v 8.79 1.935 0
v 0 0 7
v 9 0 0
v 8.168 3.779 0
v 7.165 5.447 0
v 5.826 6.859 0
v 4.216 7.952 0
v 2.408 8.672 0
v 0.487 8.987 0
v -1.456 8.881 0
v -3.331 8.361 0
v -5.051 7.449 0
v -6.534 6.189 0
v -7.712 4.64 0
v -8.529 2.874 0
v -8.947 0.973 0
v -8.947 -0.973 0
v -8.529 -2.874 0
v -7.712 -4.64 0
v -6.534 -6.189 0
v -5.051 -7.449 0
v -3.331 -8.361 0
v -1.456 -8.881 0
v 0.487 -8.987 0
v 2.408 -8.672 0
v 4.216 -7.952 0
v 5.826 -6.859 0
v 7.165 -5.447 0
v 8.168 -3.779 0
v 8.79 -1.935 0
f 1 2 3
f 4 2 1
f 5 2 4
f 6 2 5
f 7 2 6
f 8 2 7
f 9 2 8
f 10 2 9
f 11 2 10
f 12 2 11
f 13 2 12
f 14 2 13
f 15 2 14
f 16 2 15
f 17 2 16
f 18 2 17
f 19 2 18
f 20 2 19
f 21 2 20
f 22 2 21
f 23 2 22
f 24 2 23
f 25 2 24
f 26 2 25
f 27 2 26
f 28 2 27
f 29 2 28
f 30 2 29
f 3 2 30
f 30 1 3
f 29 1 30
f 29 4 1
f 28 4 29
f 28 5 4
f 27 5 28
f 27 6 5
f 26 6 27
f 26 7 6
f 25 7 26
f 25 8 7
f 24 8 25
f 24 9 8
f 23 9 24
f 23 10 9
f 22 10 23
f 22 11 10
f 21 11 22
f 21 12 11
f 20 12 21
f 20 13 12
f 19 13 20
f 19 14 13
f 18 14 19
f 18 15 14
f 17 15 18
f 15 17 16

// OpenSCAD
// Generated by SolidPython 1.0.1 on 2020-07-29 00:46:43


cylinder(h = 7, r1 = 9, r2 = 0);
/***********************************************
*********      SolidPython code:      **********
************************************************
 
# import packages: SolidPython
from solid import *
from solid.utils import *
from itertools import chain, combinations, permutations


class Resize:

    def __init__(self, scad_file):
        self.scad_file = scad_file
        #self.scad_file = import_scad(scad_file)
        # cone/cylinder param:
        self.r1 = 0
        self.r2 = 0
        self.h = 0
        # rectangular prism param:
        self.w = 0
        self.l = 0
        # ellipse param:
        self.r = 0

    # import OpenScad code (file name corresponds to shape)


    # classify shape + parameters
    def assign(self, param1, param2, param3):
        if self.scad_file == 'cone.scad':
            self.r1 = param1
            self.r2 = param2
            self.h = param3
        elif self.scad_file == 'cylinder.scad':
            self.r1 = param1
            self.r2 = param2
            self.h = param3
        elif self.scad_file == 'rectangularPrism.scad':
            self.h = param1
            self.l = param2
            self.w = param3
        else:
            self.r = param1
            self.h = param2

    # resize parameters
    def iterate(self):
        x = range(3, 20, 2)
        i = 1
        if self.scad_file == 'cone.scad':
            tempList = list(permutations(x, 2))
            for temp in tempList:
                param1 = temp[0]
                param2 = temp[1]
                filepath = 'produced_scad_files/' + 'cone' + str(param1) + '_' + str(param2) + '_' + '.scad'
                scad_render_to_file(cylinder(h=param1, r1=param2, r2=0), filepath)

        elif self.scad_file == 'cylinder.scad':
            tempList = list(permutations(x, 3))
            for temp in tempList:
                param1 = temp[0]
                param2 = temp[1]
                filepath = 'produced_scad_files/' + 'cylinder' + str(param1) + '_' + str(param2) + '_' + '.scad'
                scad_render_to_file(cylinder(h=param1, r1=param2, r2=param2), filepath)

        elif self.scad_file == 'rectangularPrism.scad':
            tempList = list(permutations(x, 3))
            for temp in tempList:
                param1 = temp[0]
                param2 = temp[1]
                param3 = temp[2]
                filepath = 'produced_scad_files/' + 'rectangularPrism' + str(param1) + '_' + str(param2) + '_' + str(
                    param3) + '.scad'
                scad_render_to_file(cube(size=(param1, param2, param3)), filepath)

        elif self.scad_file == 'ellipse.scad':
            tempList = list(permutations(x, 4))
            for temp in tempList:
                param1 = temp[0]
                param2 = temp[1]
                param3 = temp[2]
                param4 = temp[3]
                filepath = 'produced_scad_files/' + 'ellipse' + str(param1) + '_' + str(param2) + '_' + str(param3) + '_' + str(param4) + '.scad'
                scad_render_to_file(scale([param1, param2, param3])(sphere(r=param4)), filepath)

    def render_to_scadfile(self):
        scad_render_to_file(scad, 'example.scad') 
 
************************************************/
